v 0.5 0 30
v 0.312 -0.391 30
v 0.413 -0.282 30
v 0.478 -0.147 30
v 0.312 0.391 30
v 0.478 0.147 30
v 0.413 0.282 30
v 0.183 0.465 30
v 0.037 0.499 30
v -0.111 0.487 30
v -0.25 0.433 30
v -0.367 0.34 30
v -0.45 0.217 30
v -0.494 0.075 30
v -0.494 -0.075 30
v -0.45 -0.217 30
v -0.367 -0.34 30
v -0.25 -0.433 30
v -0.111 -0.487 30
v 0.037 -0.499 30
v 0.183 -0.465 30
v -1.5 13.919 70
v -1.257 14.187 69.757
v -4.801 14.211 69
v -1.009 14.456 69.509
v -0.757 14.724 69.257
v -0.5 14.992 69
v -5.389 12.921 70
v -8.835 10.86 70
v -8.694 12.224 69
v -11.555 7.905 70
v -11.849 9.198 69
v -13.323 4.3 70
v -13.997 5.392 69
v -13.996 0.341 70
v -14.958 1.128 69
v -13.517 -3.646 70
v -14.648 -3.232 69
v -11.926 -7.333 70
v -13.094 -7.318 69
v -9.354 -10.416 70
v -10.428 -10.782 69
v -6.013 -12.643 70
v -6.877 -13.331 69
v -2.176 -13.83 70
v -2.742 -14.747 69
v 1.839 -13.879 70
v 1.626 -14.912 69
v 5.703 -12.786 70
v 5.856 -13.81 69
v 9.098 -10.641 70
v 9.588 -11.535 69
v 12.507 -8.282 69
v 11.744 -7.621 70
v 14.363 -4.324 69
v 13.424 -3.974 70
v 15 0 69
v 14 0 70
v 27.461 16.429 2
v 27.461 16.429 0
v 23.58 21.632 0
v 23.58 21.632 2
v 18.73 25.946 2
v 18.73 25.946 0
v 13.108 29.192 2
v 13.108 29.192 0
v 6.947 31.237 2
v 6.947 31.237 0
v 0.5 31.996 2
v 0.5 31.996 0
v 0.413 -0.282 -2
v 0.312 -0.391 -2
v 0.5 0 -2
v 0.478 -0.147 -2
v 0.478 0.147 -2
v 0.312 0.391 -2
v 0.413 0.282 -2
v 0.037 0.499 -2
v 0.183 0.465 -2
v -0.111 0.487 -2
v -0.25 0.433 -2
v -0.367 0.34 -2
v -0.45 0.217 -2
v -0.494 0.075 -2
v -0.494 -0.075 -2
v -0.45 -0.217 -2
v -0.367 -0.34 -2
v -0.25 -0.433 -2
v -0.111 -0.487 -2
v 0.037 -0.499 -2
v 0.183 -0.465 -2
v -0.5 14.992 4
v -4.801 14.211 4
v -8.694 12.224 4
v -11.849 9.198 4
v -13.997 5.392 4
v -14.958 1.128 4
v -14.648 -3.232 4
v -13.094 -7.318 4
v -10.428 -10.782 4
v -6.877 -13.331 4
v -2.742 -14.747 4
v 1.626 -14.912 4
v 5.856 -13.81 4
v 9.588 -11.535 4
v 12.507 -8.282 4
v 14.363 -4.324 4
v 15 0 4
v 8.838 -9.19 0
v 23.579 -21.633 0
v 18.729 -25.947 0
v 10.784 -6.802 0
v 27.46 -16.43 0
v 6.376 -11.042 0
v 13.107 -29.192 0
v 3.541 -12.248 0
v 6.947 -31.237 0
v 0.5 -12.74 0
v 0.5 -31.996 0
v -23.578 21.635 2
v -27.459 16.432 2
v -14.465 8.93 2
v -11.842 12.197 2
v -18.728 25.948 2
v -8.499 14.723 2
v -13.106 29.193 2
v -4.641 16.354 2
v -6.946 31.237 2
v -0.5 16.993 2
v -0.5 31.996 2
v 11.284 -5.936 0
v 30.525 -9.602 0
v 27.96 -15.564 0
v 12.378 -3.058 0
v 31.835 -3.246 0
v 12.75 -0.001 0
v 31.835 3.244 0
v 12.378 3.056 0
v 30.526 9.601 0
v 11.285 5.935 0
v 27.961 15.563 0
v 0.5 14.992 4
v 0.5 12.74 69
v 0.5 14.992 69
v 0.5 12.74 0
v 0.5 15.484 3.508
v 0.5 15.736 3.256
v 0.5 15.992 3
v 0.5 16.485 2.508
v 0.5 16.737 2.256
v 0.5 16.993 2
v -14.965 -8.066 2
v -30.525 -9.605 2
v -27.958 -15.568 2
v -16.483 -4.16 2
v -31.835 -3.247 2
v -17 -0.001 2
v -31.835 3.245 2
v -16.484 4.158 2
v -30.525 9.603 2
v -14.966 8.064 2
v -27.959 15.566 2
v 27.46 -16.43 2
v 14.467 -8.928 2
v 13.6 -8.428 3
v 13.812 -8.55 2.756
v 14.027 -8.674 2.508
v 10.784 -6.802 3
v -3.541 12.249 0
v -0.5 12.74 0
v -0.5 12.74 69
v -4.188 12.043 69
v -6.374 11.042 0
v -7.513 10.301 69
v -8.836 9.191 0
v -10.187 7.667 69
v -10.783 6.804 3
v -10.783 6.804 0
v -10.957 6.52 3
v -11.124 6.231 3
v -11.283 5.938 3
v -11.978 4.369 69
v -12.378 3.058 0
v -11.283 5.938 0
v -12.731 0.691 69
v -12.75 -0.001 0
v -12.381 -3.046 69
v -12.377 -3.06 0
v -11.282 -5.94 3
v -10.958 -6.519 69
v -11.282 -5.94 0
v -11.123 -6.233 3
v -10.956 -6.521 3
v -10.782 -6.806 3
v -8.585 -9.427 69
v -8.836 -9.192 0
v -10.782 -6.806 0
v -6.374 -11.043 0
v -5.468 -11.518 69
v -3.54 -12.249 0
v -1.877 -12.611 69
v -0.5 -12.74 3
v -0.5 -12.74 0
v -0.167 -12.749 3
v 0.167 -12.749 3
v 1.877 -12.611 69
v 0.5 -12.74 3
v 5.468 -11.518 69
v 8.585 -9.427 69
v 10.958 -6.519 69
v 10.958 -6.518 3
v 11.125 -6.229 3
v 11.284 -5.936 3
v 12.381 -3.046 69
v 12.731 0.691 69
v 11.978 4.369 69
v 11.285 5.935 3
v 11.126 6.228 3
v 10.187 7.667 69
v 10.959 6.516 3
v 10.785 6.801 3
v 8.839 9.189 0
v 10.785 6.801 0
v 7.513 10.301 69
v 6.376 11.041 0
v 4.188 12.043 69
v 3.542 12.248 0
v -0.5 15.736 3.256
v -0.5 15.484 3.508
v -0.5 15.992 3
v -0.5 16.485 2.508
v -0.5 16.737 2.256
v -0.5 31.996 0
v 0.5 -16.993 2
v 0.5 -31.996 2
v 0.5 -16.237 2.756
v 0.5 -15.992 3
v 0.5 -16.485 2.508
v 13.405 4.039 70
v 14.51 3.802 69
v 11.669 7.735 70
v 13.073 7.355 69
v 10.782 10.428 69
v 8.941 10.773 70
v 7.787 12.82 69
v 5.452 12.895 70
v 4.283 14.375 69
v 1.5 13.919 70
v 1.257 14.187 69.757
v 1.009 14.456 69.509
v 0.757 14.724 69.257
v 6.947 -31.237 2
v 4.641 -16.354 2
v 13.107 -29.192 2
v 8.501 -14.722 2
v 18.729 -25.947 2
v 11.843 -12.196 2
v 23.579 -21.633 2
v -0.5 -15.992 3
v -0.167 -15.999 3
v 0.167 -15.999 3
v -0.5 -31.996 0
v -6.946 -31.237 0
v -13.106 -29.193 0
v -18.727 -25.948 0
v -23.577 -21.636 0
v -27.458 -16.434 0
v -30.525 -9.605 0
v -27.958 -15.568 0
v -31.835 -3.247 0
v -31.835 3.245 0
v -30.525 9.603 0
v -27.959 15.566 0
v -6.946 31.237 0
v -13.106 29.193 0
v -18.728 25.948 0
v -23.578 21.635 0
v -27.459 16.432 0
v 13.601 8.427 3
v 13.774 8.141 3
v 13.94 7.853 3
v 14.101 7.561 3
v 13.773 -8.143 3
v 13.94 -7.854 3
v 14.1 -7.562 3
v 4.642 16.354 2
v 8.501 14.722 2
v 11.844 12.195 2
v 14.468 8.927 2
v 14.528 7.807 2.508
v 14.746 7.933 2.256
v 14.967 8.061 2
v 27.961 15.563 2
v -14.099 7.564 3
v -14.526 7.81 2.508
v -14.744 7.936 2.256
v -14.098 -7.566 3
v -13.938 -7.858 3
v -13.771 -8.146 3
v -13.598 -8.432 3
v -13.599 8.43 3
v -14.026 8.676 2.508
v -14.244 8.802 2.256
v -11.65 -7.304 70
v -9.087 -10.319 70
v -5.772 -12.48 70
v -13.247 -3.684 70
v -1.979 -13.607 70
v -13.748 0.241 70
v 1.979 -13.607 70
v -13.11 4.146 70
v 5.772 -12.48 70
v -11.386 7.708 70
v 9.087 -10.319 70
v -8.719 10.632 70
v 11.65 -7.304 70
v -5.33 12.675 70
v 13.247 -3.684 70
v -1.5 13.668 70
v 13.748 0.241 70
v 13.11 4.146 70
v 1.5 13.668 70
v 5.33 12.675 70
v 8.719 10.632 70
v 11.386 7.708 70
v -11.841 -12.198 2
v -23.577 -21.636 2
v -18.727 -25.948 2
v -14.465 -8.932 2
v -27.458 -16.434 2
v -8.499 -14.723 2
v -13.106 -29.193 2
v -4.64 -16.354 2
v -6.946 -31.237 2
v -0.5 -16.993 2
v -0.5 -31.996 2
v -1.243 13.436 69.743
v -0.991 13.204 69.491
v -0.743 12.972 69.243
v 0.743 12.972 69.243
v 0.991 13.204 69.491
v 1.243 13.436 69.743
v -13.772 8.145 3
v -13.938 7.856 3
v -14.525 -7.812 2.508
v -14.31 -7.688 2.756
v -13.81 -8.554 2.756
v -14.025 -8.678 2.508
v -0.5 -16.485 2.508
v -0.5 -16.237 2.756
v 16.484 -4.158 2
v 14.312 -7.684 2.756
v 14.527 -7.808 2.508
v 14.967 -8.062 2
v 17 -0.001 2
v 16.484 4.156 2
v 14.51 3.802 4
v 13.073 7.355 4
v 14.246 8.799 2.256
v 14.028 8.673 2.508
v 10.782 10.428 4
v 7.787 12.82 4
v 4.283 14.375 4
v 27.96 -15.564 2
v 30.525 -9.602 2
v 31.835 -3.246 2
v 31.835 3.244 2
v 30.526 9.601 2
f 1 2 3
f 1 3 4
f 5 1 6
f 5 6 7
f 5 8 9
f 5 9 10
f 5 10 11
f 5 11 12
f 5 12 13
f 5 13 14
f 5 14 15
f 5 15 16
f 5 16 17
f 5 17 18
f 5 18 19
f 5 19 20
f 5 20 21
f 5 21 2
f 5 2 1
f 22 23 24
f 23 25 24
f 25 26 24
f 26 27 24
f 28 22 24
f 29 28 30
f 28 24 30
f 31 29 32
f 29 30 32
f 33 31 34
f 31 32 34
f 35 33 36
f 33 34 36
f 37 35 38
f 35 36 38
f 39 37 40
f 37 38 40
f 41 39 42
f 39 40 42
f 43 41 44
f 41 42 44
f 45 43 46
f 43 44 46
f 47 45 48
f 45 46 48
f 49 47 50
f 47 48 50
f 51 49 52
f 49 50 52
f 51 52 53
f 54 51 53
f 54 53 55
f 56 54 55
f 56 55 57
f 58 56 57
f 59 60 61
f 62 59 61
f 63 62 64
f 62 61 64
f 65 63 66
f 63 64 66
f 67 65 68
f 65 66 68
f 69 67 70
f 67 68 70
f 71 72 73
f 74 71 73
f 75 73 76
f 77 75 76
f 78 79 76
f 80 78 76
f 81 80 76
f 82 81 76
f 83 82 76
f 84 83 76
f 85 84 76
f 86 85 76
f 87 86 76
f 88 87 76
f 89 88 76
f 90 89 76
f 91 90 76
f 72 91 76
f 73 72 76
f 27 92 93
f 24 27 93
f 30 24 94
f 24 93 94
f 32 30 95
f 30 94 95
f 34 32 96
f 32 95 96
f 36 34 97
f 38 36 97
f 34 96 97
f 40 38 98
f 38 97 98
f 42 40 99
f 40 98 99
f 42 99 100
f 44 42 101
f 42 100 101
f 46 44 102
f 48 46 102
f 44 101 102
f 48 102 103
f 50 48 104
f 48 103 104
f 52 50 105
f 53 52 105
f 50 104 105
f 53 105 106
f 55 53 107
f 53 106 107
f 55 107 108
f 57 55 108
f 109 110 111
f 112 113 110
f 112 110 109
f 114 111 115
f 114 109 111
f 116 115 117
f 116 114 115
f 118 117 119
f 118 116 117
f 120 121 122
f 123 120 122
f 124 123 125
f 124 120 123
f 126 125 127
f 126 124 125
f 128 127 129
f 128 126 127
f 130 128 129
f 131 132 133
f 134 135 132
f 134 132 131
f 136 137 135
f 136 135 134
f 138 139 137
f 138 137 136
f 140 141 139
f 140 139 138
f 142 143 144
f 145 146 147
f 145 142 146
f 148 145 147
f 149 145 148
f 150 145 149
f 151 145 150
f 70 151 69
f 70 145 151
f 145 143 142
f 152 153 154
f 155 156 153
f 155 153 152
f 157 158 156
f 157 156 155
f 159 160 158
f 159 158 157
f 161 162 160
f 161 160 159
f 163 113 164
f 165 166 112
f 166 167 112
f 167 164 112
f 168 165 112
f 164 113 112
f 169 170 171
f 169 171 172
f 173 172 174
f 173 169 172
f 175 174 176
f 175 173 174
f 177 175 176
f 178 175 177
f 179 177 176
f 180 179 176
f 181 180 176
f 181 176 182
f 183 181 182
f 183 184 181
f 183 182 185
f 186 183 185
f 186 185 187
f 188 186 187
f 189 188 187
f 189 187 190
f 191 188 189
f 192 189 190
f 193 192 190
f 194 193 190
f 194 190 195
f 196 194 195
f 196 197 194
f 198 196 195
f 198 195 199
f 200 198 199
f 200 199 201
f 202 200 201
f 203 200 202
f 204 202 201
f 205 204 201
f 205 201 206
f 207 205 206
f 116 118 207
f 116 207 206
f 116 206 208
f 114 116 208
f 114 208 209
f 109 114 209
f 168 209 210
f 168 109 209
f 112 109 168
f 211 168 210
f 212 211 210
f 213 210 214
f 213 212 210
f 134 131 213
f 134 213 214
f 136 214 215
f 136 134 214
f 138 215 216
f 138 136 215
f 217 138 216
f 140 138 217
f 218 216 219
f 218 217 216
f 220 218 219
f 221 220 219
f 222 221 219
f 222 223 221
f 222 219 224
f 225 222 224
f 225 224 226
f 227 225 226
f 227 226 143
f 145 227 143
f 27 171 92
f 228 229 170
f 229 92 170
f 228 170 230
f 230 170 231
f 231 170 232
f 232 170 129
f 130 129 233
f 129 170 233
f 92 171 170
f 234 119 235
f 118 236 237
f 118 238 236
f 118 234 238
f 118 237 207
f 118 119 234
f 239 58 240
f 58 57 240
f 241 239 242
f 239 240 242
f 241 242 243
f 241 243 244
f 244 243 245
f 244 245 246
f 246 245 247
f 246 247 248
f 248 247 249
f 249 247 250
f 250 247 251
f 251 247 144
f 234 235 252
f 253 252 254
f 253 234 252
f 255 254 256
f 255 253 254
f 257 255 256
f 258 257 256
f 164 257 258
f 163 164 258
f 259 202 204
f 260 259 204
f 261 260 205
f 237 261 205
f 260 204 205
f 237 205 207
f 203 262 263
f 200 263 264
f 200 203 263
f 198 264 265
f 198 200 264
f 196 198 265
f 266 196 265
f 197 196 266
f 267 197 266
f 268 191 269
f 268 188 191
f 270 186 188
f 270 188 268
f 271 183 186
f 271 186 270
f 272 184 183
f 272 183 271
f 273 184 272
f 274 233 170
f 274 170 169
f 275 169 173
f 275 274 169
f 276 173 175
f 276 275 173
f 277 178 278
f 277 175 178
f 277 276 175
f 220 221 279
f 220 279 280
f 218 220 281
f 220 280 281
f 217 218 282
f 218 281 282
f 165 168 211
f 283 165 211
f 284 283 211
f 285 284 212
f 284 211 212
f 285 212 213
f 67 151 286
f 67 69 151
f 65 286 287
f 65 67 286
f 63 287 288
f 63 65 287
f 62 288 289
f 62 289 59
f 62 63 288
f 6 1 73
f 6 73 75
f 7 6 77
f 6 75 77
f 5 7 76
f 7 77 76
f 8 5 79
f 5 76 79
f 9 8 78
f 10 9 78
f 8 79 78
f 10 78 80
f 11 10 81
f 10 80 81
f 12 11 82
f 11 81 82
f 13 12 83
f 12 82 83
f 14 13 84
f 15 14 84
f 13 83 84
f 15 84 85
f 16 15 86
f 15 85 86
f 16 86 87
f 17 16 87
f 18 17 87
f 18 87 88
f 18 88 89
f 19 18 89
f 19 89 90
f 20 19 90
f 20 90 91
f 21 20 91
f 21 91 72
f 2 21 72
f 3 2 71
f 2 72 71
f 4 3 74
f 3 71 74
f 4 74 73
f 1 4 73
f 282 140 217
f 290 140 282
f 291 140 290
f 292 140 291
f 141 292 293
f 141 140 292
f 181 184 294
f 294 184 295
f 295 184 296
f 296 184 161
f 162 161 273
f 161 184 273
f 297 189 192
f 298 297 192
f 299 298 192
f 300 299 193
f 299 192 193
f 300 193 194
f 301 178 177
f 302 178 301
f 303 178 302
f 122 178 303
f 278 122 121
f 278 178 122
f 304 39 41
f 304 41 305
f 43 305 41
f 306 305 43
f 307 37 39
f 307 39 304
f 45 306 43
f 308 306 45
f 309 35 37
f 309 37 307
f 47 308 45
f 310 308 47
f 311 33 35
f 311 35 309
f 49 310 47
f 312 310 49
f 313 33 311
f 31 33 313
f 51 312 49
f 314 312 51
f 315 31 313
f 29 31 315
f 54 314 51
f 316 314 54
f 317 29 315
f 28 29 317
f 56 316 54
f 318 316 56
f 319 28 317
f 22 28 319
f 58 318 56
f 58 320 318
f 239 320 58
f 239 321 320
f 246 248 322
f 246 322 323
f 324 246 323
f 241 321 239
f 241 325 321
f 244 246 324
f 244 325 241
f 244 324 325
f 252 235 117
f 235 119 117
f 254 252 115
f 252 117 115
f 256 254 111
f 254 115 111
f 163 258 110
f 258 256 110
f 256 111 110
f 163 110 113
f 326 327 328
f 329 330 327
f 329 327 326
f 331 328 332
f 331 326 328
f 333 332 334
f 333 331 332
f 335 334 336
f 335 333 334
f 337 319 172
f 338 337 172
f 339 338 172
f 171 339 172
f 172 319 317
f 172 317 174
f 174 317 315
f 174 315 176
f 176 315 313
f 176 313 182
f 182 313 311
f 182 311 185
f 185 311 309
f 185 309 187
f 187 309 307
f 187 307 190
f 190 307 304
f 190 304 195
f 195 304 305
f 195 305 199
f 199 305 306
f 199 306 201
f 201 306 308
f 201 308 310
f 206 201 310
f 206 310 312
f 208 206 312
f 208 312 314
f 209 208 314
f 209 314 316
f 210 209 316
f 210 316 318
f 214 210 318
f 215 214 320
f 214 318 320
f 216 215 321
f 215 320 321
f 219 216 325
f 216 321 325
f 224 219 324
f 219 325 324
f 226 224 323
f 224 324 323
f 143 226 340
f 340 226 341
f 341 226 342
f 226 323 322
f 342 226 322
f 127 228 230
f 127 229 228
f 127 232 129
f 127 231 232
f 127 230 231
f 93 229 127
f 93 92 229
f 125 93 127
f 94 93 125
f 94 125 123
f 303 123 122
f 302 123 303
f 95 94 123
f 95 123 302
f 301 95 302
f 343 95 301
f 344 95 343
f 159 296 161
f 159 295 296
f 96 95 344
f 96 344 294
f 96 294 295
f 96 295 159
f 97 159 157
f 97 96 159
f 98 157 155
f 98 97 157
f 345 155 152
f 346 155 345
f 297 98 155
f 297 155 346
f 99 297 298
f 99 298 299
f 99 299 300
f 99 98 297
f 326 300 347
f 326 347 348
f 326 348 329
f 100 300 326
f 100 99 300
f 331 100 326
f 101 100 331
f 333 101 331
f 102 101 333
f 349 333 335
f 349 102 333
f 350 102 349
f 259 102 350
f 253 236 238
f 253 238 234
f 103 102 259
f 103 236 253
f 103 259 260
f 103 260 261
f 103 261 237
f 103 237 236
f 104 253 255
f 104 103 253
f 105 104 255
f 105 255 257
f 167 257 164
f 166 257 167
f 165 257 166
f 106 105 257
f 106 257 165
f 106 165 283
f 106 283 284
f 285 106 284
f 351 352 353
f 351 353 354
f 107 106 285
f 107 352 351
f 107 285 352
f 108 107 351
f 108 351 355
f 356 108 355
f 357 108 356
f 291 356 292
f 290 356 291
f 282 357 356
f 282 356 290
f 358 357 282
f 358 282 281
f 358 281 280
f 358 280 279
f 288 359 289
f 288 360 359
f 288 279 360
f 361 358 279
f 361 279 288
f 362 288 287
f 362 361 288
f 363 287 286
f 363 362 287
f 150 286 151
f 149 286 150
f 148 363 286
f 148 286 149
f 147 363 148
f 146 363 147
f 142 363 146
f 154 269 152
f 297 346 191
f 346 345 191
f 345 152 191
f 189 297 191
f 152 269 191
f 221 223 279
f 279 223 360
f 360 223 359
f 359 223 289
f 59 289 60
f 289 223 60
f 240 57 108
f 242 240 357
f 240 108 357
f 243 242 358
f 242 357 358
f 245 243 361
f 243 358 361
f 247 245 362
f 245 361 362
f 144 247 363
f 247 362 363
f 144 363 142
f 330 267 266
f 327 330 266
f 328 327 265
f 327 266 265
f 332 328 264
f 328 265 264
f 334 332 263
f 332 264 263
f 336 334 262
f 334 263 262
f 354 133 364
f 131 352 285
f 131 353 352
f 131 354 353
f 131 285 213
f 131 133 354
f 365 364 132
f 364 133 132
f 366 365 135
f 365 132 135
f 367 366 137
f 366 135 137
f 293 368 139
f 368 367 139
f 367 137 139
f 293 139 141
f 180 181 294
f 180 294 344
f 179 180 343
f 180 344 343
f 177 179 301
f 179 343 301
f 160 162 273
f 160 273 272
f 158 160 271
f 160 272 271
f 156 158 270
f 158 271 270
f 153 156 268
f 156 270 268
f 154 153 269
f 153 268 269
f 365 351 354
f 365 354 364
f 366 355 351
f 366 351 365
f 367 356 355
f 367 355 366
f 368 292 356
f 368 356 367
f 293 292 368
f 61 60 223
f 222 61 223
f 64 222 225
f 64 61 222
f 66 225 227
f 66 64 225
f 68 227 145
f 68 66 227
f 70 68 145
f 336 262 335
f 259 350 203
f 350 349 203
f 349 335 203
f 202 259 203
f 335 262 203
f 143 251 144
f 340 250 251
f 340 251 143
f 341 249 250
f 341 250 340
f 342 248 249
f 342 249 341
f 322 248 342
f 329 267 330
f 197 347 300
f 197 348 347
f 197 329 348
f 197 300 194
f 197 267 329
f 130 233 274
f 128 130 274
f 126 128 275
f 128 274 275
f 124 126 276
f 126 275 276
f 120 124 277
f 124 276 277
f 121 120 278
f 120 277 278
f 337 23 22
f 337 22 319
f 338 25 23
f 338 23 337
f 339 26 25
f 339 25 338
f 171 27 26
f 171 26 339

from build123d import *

# Parameters (mm, degrees)
CYLINDER003_R          = 0.5
CYLINDER003_DEPTH      = 32
BOX001_W               = 1
BOX001_H               = 80
BOX001_DEPTH           = 4
BOX001_PLACEMENT_ANGLE = 60
BOX004_W               = 1
BOX004_H               = 80
BOX004_DEPTH           = 4
BOX004_PLACEMENT_ANGLE = -60
BOX003_W               = 1
BOX003_H               = 70
BOX003_DEPTH           = 4
BOX_W                  = 1
BOX_H                  = 24
BOX_DEPTH              = 80
CYLINDER_R             = 12.75
CYLINDER_DEPTH         = 80
CYLINDER002_R          = 32
CYLINDER002_DEPTH      = 2
CYLINDER001_R          = 15
CYLINDER001_DEPTH      = 70
CHAMFER_SIZE           = 1


with BuildPart() as center_pin:
    # Cylinder003 → Cylinder003 (new body)
    with BuildSketch(Plane.XY.offset(-2)):
        Circle(CYLINDER003_R)
    extrude(amount=CYLINDER003_DEPTH)


with BuildPart() as box001:
    # Box001 → Box001 (new body)
    with BuildSketch(Plane.XY):
        with Locations((0.5, 40)):
            Rectangle(BOX001_W, BOX001_H)
    extrude(amount=BOX001_DEPTH)


with BuildPart() as box001_1:
    # Box001 placement: moved
    add(box001.part.moved(Location((40, -23.67, -1))).rotate(Axis((40, -23.67, -1), (0, 0, 1)), BOX001_PLACEMENT_ANGLE))


with BuildPart() as box004:
    # Box004 → Box004 (new body)
    with BuildSketch(Plane.XY):
        with Locations((0.5, 40)):
            Rectangle(BOX004_W, BOX004_H)
    extrude(amount=BOX004_DEPTH)


with BuildPart() as box004_1:
    # Box004 placement: moved
    add(box004.part.moved(Location((-40, -22.52, -1))).rotate(Axis((-40, -22.52, -1), (0, 0, 1)), BOX004_PLACEMENT_ANGLE))


with BuildPart() as box003:
    # Box003 → Box003 (new body)
    with BuildSketch(Plane(origin=(-0.5, -34, -1), x_dir=(1, 0, 0), z_dir=(0, 0, 1))):
        with Locations((0.5, 35)):
            Rectangle(BOX003_W, BOX003_H)
    extrude(amount=BOX003_DEPTH)


with BuildPart() as long_cut:
    # Box → Box (new body)
    with BuildSketch(Plane(origin=(-0.5, 10, -1), x_dir=(1, 0, 0), z_dir=(0, 0, 1))):
        with Locations((0.5, 12)):
            Rectangle(BOX_W, BOX_H)
    extrude(amount=BOX_DEPTH)


with BuildPart() as cylinder:
    # Cylinder → Cylinder (new body)
    with BuildSketch(Plane.XY.offset(-1)):
        Circle(CYLINDER_R)
    extrude(amount=CYLINDER_DEPTH)


with BuildPart() as ring:
    # Cylinder002 → Cylinder002 (new body)
    with BuildSketch(Plane.XY):
        Circle(CYLINDER002_R)
    extrude(amount=CYLINDER002_DEPTH)


with BuildPart() as cone:
    # Cone → Cone (revolve)
    with BuildSketch(Plane.XZ):
        Polygon((0, 0), (19, 0), (14, 5), (0, 5), align=None)
    revolve(axis=Axis((0, 0, 0), (0, 0, 1)))


with BuildPart() as chamfer_body:
    # Cylinder001 → Cylinder001 (new body)
    with BuildSketch(Plane.XY):
        Circle(CYLINDER001_R)
    extrude(amount=CYLINDER001_DEPTH)

    # Fusion: union ring, Cone
    add(ring.part)
    add(cone.part)

    # Cut: cut Cylinder
    add(cylinder.part, mode=Mode.SUBTRACT)

    # Cut001: cut long cut
    add(long_cut.part, mode=Mode.SUBTRACT)

    # Cut002: cut Box003
    add(box003.part, mode=Mode.SUBTRACT)

    # Cut003: cut Box004
    add(box004_1.part, mode=Mode.SUBTRACT)

    # Cut004: cut Box001
    add(box001_1.part, mode=Mode.SUBTRACT)

    # Chamfer
    chamfer_edges = [chamfer_body.edges().sort_by_distance(p)[0] for p in [
        (-10.428327, -10.781929, 70),
        (-0.5, 13.865928, 70),
        (-8.837067, -9.190688, 70),
        (9.190688, 8.837067, 70),
        (0.5, 13.865928, 70),
        (10.781929, 10.428327, 70),
    ]]
    chamfer(chamfer_edges, length=CHAMFER_SIZE)


solid = Compound([center_pin.part, chamfer_body.part])
